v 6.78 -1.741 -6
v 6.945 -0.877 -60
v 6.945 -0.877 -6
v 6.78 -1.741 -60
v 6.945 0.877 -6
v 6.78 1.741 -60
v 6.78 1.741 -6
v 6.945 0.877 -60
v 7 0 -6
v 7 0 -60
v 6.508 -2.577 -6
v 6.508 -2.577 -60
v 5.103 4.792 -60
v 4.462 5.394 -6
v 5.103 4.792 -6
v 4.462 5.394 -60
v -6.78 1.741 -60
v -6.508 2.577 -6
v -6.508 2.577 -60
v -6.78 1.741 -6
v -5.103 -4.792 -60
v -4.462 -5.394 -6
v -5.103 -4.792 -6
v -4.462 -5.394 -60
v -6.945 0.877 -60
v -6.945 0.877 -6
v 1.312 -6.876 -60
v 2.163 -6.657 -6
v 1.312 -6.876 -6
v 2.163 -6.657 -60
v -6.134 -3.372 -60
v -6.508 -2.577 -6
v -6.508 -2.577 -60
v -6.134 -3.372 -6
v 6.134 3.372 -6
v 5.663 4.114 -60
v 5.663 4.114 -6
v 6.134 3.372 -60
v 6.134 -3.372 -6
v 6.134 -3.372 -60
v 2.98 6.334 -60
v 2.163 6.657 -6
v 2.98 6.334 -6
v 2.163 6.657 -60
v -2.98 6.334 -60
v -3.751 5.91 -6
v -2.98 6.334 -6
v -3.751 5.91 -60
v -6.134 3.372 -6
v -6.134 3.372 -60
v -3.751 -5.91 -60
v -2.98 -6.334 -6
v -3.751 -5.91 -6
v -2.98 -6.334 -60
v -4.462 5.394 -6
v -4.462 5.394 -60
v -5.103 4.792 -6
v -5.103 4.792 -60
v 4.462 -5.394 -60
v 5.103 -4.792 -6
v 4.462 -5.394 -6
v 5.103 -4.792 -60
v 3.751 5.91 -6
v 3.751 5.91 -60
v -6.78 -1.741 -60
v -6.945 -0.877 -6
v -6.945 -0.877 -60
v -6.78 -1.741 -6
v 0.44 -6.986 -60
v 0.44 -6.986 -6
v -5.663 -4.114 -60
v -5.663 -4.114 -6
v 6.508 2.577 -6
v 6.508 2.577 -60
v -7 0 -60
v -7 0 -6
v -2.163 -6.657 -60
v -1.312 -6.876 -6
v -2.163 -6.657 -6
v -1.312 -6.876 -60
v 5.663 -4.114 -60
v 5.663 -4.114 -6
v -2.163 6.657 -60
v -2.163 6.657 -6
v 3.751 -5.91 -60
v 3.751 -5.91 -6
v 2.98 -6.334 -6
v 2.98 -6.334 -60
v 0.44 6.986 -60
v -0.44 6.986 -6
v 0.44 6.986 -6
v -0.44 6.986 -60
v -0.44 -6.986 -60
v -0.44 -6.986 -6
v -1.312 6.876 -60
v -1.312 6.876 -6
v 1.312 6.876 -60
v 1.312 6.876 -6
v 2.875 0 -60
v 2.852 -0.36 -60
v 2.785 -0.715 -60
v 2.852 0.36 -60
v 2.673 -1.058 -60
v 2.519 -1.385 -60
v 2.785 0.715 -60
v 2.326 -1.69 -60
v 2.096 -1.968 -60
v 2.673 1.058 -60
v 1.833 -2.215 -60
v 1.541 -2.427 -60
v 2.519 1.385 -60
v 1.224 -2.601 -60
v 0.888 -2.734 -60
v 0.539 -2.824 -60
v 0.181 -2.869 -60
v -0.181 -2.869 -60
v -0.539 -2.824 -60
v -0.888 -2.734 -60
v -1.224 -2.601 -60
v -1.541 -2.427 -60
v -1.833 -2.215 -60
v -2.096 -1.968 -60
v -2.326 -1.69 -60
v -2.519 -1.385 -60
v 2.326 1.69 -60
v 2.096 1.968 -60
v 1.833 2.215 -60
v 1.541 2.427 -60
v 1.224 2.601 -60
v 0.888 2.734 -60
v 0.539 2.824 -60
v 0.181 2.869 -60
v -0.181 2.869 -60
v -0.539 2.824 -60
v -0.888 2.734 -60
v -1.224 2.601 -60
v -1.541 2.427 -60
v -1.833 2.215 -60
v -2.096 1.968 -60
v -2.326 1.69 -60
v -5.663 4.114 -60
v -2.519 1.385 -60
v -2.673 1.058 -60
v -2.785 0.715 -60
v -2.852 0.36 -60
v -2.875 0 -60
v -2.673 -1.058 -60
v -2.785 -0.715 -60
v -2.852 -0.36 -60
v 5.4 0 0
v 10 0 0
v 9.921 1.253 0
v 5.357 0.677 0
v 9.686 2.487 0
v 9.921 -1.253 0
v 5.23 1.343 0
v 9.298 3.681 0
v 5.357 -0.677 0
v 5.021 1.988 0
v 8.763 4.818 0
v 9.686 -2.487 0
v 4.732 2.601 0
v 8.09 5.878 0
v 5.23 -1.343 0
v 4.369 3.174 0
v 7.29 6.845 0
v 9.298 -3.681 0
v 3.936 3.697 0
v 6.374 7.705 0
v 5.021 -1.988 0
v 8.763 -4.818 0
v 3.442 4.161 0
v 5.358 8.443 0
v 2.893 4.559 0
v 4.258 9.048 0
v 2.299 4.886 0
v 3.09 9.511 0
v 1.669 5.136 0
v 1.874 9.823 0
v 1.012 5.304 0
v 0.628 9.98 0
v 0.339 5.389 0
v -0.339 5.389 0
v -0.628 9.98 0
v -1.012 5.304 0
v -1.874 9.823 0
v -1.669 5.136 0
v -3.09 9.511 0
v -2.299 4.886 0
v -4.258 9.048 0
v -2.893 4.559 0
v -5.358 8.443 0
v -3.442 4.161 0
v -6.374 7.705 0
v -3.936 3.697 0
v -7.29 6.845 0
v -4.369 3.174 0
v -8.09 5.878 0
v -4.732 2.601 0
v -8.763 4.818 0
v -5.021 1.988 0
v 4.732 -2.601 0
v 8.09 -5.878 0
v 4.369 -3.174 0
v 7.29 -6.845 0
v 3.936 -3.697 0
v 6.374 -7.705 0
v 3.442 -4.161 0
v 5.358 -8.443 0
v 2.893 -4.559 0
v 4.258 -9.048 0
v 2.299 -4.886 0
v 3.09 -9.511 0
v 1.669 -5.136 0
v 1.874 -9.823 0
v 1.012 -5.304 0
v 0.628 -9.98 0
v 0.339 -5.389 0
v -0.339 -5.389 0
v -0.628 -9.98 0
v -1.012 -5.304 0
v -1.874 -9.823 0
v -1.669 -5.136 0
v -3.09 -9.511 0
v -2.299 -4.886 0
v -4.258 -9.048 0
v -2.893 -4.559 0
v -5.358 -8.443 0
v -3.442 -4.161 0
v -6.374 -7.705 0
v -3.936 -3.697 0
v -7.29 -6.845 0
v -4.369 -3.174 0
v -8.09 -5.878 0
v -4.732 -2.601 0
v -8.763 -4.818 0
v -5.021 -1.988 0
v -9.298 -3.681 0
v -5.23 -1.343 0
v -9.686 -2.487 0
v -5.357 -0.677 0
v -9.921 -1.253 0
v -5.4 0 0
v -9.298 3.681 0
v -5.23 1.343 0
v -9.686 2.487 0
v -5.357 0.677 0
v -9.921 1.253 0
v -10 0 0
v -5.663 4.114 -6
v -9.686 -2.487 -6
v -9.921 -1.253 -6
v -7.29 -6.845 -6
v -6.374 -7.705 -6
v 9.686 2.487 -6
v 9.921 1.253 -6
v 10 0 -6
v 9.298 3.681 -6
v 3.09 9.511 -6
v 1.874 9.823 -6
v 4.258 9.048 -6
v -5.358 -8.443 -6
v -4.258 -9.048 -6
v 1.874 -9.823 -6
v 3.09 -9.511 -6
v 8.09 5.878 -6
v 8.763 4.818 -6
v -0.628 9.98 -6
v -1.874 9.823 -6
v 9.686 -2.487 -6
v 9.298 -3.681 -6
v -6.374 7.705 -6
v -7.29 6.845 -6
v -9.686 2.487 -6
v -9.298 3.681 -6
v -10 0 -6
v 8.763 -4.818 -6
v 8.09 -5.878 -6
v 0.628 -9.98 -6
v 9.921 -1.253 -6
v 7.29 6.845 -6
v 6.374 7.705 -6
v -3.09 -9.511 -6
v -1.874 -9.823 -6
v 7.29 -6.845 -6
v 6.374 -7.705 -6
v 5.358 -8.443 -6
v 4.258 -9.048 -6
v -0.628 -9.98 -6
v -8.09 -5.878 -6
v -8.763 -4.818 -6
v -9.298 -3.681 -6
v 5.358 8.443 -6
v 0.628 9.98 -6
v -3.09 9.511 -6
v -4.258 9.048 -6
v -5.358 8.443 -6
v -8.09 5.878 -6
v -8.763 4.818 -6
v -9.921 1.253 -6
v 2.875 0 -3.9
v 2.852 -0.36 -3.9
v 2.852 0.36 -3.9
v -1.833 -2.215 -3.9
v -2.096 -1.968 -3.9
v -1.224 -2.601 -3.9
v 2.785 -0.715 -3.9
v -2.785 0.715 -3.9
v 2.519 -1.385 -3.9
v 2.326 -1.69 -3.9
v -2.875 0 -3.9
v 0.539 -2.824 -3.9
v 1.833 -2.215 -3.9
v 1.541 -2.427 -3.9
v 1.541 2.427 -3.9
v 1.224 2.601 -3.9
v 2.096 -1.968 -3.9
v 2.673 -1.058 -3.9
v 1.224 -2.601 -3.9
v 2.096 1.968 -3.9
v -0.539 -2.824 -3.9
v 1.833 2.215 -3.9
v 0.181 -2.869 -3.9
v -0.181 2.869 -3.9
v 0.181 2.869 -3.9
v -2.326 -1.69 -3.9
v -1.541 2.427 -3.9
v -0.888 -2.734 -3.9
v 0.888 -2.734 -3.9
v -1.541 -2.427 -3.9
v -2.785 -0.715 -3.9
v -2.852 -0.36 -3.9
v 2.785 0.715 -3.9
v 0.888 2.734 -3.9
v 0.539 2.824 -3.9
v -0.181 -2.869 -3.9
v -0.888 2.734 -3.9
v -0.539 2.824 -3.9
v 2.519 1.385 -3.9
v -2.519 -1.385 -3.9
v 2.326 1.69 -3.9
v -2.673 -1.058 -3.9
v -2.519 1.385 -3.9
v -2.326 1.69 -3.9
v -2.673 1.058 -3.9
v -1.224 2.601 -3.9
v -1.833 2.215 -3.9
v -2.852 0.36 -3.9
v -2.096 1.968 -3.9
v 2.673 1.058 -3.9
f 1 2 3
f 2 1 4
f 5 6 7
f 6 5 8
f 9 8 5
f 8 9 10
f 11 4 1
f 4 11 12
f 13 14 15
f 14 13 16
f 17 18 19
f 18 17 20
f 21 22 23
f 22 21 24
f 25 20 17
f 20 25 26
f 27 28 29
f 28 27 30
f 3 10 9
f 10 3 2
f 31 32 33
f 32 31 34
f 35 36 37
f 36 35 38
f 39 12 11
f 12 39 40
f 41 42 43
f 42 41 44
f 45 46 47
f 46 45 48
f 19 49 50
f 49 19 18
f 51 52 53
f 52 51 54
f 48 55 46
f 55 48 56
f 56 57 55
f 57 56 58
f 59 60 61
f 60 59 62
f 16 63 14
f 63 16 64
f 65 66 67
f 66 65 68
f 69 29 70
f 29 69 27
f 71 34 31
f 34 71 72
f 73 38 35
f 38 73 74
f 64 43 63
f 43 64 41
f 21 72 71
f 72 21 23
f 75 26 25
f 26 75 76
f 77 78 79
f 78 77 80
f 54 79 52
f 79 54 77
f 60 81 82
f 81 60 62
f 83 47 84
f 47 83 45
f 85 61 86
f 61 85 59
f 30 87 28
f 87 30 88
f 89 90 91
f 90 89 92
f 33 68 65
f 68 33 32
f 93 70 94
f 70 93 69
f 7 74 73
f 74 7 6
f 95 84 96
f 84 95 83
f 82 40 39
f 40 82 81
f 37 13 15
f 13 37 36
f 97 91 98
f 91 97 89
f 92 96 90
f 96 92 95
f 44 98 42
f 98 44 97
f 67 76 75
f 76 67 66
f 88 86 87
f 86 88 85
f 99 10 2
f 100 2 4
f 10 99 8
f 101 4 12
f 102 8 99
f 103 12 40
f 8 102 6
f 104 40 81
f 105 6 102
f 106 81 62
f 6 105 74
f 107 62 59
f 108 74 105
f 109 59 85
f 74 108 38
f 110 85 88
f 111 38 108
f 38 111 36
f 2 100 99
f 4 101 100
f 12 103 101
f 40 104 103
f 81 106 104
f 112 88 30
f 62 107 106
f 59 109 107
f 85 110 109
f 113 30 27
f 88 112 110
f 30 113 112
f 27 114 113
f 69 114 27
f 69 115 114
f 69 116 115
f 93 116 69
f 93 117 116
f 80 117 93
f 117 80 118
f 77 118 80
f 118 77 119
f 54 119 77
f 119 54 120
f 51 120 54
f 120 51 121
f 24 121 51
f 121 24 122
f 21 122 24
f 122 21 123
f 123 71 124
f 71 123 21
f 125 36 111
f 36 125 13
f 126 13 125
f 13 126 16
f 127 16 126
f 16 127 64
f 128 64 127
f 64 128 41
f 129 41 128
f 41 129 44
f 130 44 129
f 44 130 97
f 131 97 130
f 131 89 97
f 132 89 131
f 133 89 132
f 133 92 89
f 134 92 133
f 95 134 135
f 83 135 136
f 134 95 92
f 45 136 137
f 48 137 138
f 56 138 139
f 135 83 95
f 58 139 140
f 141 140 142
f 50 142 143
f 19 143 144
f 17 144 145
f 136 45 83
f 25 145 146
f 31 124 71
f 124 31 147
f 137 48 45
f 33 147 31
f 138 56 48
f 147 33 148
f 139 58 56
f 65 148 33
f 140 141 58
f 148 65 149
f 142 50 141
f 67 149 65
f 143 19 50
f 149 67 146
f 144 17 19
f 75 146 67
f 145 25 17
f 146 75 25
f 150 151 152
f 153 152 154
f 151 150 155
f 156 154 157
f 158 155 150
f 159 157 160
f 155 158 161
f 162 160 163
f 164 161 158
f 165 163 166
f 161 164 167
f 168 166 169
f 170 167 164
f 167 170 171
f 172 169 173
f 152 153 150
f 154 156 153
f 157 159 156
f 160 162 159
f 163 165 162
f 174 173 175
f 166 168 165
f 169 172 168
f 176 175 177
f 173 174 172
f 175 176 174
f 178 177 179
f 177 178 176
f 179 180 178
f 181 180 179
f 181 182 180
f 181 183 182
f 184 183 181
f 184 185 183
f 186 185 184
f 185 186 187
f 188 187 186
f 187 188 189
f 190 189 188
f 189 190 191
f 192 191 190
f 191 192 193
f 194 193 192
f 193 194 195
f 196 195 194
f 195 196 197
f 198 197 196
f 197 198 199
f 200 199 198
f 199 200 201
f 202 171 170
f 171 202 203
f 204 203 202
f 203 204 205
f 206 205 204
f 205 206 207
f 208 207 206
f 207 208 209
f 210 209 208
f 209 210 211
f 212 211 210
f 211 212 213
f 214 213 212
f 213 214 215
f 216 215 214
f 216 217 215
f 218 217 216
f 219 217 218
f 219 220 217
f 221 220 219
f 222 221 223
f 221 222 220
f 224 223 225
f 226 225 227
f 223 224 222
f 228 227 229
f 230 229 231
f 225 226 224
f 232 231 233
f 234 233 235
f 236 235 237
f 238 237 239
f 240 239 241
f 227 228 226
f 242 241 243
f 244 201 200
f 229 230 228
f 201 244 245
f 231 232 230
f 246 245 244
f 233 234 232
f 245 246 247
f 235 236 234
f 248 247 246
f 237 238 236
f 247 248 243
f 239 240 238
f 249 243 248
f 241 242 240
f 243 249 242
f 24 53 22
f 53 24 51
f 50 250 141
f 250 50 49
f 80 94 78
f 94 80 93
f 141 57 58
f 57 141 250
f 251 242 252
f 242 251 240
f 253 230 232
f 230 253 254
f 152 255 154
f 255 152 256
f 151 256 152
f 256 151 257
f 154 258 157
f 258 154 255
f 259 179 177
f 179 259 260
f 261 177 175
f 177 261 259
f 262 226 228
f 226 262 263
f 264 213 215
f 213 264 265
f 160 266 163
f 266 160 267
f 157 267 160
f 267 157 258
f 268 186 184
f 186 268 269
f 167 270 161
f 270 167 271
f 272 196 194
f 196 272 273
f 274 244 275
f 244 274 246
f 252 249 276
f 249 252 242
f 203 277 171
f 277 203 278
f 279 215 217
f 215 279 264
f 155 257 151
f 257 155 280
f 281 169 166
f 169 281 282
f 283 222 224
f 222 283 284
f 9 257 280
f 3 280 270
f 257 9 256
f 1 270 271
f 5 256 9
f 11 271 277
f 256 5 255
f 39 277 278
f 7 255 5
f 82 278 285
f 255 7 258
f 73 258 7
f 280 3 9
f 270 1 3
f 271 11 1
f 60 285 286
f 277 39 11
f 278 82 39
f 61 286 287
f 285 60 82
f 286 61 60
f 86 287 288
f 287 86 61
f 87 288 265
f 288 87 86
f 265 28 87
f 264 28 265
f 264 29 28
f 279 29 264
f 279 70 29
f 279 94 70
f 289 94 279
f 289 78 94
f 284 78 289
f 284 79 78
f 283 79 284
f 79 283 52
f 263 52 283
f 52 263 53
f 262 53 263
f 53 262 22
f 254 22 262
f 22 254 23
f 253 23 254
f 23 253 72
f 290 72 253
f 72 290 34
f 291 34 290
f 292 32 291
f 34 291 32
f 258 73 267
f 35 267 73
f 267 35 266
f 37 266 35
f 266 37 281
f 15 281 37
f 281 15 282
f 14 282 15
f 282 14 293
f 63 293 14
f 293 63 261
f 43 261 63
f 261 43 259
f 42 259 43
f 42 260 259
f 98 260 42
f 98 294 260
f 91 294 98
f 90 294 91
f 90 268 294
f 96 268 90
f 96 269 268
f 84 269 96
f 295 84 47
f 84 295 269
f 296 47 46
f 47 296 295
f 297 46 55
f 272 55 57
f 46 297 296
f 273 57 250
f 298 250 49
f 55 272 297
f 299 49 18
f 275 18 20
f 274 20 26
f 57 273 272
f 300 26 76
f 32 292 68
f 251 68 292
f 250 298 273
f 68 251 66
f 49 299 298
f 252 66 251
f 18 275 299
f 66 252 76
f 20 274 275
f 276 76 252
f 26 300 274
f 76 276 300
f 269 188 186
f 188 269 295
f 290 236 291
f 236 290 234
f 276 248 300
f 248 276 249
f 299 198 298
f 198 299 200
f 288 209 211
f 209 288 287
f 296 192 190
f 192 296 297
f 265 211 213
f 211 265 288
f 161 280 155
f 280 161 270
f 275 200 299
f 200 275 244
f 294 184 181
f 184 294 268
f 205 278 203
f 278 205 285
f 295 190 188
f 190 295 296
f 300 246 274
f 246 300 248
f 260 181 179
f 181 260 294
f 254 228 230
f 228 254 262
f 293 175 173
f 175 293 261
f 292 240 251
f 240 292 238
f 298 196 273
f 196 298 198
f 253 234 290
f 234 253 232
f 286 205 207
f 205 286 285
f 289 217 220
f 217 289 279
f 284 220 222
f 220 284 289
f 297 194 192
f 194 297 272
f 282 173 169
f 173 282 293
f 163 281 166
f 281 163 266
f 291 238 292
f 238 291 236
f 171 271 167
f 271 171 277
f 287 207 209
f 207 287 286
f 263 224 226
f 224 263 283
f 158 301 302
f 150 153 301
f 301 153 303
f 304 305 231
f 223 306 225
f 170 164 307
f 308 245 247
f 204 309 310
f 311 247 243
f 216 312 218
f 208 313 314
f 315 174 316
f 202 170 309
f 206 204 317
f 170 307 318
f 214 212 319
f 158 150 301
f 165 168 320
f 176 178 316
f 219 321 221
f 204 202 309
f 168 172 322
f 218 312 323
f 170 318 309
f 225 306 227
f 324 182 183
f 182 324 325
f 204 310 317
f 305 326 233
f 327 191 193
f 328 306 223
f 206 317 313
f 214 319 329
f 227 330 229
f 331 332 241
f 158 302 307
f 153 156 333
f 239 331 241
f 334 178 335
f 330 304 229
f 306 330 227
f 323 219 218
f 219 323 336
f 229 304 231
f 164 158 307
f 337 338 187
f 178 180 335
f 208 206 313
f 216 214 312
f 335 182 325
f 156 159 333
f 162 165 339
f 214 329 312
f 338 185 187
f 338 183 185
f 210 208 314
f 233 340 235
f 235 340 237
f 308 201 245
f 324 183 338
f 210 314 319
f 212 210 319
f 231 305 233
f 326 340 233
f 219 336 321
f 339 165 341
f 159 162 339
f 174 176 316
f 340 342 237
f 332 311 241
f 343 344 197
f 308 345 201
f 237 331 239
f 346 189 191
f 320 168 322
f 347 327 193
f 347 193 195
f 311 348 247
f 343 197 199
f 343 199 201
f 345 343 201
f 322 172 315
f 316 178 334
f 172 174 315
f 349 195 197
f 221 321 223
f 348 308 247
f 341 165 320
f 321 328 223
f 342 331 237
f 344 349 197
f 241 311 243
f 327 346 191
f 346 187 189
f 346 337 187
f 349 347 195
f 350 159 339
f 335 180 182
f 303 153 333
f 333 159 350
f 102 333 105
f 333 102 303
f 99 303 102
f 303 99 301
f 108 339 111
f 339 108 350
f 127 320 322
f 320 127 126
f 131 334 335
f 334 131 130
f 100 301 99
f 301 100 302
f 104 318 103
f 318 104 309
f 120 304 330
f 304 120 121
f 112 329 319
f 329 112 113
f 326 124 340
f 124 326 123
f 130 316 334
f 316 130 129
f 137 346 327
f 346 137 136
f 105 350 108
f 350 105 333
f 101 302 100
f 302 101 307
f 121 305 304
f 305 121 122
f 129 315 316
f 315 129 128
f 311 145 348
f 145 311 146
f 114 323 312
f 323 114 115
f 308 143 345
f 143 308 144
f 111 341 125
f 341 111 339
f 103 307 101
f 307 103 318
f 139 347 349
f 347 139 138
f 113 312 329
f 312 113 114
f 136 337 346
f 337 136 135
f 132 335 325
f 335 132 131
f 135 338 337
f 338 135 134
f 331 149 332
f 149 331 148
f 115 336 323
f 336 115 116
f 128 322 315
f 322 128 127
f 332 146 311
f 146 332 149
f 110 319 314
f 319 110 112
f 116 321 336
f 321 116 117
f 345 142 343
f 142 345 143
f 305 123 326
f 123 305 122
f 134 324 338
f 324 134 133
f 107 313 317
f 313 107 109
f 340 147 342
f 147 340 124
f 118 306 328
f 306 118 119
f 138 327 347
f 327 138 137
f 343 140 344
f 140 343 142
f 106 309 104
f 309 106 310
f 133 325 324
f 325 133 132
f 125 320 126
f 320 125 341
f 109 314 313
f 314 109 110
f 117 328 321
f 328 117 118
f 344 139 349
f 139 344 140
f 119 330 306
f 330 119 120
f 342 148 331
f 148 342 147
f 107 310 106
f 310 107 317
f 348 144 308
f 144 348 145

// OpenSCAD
$fn = 50;


difference() {
	union() {
		translate(v = [0, 0, -60.0000000000]) {
			cylinder(h = 60, r = 7.0000000000);
		}
		translate(v = [0, 0, -6.0000000000]) {
			cylinder(h = 6, r = 10.0000000000);
		}
	}
	union() {
		translate(v = [0, 0, 0]) {
			rotate(a = [0, 0, 0]) {
				difference() {
					union() {
						#translate(v = [0, 0, -60.0000000000]) {
							cylinder(h = 60, r = 2.6000000000);
						}
						#translate(v = [0, 0, -3.9000000000]) {
							cylinder(h = 3.9000000000, r = 7.0000000000, r1 = 2.8750000000, r2 = 5.4000000000);
						}
						#translate(v = [0, 0, -60.0000000000]) {
							cylinder(h = 60, r = 2.8750000000);
						}
						#translate(v = [0, 0, -60.0000000000]) {
							cylinder(h = 60, r = 2.6000000000);
						}
					}
					union();
				}
			}
		}
	}
}
